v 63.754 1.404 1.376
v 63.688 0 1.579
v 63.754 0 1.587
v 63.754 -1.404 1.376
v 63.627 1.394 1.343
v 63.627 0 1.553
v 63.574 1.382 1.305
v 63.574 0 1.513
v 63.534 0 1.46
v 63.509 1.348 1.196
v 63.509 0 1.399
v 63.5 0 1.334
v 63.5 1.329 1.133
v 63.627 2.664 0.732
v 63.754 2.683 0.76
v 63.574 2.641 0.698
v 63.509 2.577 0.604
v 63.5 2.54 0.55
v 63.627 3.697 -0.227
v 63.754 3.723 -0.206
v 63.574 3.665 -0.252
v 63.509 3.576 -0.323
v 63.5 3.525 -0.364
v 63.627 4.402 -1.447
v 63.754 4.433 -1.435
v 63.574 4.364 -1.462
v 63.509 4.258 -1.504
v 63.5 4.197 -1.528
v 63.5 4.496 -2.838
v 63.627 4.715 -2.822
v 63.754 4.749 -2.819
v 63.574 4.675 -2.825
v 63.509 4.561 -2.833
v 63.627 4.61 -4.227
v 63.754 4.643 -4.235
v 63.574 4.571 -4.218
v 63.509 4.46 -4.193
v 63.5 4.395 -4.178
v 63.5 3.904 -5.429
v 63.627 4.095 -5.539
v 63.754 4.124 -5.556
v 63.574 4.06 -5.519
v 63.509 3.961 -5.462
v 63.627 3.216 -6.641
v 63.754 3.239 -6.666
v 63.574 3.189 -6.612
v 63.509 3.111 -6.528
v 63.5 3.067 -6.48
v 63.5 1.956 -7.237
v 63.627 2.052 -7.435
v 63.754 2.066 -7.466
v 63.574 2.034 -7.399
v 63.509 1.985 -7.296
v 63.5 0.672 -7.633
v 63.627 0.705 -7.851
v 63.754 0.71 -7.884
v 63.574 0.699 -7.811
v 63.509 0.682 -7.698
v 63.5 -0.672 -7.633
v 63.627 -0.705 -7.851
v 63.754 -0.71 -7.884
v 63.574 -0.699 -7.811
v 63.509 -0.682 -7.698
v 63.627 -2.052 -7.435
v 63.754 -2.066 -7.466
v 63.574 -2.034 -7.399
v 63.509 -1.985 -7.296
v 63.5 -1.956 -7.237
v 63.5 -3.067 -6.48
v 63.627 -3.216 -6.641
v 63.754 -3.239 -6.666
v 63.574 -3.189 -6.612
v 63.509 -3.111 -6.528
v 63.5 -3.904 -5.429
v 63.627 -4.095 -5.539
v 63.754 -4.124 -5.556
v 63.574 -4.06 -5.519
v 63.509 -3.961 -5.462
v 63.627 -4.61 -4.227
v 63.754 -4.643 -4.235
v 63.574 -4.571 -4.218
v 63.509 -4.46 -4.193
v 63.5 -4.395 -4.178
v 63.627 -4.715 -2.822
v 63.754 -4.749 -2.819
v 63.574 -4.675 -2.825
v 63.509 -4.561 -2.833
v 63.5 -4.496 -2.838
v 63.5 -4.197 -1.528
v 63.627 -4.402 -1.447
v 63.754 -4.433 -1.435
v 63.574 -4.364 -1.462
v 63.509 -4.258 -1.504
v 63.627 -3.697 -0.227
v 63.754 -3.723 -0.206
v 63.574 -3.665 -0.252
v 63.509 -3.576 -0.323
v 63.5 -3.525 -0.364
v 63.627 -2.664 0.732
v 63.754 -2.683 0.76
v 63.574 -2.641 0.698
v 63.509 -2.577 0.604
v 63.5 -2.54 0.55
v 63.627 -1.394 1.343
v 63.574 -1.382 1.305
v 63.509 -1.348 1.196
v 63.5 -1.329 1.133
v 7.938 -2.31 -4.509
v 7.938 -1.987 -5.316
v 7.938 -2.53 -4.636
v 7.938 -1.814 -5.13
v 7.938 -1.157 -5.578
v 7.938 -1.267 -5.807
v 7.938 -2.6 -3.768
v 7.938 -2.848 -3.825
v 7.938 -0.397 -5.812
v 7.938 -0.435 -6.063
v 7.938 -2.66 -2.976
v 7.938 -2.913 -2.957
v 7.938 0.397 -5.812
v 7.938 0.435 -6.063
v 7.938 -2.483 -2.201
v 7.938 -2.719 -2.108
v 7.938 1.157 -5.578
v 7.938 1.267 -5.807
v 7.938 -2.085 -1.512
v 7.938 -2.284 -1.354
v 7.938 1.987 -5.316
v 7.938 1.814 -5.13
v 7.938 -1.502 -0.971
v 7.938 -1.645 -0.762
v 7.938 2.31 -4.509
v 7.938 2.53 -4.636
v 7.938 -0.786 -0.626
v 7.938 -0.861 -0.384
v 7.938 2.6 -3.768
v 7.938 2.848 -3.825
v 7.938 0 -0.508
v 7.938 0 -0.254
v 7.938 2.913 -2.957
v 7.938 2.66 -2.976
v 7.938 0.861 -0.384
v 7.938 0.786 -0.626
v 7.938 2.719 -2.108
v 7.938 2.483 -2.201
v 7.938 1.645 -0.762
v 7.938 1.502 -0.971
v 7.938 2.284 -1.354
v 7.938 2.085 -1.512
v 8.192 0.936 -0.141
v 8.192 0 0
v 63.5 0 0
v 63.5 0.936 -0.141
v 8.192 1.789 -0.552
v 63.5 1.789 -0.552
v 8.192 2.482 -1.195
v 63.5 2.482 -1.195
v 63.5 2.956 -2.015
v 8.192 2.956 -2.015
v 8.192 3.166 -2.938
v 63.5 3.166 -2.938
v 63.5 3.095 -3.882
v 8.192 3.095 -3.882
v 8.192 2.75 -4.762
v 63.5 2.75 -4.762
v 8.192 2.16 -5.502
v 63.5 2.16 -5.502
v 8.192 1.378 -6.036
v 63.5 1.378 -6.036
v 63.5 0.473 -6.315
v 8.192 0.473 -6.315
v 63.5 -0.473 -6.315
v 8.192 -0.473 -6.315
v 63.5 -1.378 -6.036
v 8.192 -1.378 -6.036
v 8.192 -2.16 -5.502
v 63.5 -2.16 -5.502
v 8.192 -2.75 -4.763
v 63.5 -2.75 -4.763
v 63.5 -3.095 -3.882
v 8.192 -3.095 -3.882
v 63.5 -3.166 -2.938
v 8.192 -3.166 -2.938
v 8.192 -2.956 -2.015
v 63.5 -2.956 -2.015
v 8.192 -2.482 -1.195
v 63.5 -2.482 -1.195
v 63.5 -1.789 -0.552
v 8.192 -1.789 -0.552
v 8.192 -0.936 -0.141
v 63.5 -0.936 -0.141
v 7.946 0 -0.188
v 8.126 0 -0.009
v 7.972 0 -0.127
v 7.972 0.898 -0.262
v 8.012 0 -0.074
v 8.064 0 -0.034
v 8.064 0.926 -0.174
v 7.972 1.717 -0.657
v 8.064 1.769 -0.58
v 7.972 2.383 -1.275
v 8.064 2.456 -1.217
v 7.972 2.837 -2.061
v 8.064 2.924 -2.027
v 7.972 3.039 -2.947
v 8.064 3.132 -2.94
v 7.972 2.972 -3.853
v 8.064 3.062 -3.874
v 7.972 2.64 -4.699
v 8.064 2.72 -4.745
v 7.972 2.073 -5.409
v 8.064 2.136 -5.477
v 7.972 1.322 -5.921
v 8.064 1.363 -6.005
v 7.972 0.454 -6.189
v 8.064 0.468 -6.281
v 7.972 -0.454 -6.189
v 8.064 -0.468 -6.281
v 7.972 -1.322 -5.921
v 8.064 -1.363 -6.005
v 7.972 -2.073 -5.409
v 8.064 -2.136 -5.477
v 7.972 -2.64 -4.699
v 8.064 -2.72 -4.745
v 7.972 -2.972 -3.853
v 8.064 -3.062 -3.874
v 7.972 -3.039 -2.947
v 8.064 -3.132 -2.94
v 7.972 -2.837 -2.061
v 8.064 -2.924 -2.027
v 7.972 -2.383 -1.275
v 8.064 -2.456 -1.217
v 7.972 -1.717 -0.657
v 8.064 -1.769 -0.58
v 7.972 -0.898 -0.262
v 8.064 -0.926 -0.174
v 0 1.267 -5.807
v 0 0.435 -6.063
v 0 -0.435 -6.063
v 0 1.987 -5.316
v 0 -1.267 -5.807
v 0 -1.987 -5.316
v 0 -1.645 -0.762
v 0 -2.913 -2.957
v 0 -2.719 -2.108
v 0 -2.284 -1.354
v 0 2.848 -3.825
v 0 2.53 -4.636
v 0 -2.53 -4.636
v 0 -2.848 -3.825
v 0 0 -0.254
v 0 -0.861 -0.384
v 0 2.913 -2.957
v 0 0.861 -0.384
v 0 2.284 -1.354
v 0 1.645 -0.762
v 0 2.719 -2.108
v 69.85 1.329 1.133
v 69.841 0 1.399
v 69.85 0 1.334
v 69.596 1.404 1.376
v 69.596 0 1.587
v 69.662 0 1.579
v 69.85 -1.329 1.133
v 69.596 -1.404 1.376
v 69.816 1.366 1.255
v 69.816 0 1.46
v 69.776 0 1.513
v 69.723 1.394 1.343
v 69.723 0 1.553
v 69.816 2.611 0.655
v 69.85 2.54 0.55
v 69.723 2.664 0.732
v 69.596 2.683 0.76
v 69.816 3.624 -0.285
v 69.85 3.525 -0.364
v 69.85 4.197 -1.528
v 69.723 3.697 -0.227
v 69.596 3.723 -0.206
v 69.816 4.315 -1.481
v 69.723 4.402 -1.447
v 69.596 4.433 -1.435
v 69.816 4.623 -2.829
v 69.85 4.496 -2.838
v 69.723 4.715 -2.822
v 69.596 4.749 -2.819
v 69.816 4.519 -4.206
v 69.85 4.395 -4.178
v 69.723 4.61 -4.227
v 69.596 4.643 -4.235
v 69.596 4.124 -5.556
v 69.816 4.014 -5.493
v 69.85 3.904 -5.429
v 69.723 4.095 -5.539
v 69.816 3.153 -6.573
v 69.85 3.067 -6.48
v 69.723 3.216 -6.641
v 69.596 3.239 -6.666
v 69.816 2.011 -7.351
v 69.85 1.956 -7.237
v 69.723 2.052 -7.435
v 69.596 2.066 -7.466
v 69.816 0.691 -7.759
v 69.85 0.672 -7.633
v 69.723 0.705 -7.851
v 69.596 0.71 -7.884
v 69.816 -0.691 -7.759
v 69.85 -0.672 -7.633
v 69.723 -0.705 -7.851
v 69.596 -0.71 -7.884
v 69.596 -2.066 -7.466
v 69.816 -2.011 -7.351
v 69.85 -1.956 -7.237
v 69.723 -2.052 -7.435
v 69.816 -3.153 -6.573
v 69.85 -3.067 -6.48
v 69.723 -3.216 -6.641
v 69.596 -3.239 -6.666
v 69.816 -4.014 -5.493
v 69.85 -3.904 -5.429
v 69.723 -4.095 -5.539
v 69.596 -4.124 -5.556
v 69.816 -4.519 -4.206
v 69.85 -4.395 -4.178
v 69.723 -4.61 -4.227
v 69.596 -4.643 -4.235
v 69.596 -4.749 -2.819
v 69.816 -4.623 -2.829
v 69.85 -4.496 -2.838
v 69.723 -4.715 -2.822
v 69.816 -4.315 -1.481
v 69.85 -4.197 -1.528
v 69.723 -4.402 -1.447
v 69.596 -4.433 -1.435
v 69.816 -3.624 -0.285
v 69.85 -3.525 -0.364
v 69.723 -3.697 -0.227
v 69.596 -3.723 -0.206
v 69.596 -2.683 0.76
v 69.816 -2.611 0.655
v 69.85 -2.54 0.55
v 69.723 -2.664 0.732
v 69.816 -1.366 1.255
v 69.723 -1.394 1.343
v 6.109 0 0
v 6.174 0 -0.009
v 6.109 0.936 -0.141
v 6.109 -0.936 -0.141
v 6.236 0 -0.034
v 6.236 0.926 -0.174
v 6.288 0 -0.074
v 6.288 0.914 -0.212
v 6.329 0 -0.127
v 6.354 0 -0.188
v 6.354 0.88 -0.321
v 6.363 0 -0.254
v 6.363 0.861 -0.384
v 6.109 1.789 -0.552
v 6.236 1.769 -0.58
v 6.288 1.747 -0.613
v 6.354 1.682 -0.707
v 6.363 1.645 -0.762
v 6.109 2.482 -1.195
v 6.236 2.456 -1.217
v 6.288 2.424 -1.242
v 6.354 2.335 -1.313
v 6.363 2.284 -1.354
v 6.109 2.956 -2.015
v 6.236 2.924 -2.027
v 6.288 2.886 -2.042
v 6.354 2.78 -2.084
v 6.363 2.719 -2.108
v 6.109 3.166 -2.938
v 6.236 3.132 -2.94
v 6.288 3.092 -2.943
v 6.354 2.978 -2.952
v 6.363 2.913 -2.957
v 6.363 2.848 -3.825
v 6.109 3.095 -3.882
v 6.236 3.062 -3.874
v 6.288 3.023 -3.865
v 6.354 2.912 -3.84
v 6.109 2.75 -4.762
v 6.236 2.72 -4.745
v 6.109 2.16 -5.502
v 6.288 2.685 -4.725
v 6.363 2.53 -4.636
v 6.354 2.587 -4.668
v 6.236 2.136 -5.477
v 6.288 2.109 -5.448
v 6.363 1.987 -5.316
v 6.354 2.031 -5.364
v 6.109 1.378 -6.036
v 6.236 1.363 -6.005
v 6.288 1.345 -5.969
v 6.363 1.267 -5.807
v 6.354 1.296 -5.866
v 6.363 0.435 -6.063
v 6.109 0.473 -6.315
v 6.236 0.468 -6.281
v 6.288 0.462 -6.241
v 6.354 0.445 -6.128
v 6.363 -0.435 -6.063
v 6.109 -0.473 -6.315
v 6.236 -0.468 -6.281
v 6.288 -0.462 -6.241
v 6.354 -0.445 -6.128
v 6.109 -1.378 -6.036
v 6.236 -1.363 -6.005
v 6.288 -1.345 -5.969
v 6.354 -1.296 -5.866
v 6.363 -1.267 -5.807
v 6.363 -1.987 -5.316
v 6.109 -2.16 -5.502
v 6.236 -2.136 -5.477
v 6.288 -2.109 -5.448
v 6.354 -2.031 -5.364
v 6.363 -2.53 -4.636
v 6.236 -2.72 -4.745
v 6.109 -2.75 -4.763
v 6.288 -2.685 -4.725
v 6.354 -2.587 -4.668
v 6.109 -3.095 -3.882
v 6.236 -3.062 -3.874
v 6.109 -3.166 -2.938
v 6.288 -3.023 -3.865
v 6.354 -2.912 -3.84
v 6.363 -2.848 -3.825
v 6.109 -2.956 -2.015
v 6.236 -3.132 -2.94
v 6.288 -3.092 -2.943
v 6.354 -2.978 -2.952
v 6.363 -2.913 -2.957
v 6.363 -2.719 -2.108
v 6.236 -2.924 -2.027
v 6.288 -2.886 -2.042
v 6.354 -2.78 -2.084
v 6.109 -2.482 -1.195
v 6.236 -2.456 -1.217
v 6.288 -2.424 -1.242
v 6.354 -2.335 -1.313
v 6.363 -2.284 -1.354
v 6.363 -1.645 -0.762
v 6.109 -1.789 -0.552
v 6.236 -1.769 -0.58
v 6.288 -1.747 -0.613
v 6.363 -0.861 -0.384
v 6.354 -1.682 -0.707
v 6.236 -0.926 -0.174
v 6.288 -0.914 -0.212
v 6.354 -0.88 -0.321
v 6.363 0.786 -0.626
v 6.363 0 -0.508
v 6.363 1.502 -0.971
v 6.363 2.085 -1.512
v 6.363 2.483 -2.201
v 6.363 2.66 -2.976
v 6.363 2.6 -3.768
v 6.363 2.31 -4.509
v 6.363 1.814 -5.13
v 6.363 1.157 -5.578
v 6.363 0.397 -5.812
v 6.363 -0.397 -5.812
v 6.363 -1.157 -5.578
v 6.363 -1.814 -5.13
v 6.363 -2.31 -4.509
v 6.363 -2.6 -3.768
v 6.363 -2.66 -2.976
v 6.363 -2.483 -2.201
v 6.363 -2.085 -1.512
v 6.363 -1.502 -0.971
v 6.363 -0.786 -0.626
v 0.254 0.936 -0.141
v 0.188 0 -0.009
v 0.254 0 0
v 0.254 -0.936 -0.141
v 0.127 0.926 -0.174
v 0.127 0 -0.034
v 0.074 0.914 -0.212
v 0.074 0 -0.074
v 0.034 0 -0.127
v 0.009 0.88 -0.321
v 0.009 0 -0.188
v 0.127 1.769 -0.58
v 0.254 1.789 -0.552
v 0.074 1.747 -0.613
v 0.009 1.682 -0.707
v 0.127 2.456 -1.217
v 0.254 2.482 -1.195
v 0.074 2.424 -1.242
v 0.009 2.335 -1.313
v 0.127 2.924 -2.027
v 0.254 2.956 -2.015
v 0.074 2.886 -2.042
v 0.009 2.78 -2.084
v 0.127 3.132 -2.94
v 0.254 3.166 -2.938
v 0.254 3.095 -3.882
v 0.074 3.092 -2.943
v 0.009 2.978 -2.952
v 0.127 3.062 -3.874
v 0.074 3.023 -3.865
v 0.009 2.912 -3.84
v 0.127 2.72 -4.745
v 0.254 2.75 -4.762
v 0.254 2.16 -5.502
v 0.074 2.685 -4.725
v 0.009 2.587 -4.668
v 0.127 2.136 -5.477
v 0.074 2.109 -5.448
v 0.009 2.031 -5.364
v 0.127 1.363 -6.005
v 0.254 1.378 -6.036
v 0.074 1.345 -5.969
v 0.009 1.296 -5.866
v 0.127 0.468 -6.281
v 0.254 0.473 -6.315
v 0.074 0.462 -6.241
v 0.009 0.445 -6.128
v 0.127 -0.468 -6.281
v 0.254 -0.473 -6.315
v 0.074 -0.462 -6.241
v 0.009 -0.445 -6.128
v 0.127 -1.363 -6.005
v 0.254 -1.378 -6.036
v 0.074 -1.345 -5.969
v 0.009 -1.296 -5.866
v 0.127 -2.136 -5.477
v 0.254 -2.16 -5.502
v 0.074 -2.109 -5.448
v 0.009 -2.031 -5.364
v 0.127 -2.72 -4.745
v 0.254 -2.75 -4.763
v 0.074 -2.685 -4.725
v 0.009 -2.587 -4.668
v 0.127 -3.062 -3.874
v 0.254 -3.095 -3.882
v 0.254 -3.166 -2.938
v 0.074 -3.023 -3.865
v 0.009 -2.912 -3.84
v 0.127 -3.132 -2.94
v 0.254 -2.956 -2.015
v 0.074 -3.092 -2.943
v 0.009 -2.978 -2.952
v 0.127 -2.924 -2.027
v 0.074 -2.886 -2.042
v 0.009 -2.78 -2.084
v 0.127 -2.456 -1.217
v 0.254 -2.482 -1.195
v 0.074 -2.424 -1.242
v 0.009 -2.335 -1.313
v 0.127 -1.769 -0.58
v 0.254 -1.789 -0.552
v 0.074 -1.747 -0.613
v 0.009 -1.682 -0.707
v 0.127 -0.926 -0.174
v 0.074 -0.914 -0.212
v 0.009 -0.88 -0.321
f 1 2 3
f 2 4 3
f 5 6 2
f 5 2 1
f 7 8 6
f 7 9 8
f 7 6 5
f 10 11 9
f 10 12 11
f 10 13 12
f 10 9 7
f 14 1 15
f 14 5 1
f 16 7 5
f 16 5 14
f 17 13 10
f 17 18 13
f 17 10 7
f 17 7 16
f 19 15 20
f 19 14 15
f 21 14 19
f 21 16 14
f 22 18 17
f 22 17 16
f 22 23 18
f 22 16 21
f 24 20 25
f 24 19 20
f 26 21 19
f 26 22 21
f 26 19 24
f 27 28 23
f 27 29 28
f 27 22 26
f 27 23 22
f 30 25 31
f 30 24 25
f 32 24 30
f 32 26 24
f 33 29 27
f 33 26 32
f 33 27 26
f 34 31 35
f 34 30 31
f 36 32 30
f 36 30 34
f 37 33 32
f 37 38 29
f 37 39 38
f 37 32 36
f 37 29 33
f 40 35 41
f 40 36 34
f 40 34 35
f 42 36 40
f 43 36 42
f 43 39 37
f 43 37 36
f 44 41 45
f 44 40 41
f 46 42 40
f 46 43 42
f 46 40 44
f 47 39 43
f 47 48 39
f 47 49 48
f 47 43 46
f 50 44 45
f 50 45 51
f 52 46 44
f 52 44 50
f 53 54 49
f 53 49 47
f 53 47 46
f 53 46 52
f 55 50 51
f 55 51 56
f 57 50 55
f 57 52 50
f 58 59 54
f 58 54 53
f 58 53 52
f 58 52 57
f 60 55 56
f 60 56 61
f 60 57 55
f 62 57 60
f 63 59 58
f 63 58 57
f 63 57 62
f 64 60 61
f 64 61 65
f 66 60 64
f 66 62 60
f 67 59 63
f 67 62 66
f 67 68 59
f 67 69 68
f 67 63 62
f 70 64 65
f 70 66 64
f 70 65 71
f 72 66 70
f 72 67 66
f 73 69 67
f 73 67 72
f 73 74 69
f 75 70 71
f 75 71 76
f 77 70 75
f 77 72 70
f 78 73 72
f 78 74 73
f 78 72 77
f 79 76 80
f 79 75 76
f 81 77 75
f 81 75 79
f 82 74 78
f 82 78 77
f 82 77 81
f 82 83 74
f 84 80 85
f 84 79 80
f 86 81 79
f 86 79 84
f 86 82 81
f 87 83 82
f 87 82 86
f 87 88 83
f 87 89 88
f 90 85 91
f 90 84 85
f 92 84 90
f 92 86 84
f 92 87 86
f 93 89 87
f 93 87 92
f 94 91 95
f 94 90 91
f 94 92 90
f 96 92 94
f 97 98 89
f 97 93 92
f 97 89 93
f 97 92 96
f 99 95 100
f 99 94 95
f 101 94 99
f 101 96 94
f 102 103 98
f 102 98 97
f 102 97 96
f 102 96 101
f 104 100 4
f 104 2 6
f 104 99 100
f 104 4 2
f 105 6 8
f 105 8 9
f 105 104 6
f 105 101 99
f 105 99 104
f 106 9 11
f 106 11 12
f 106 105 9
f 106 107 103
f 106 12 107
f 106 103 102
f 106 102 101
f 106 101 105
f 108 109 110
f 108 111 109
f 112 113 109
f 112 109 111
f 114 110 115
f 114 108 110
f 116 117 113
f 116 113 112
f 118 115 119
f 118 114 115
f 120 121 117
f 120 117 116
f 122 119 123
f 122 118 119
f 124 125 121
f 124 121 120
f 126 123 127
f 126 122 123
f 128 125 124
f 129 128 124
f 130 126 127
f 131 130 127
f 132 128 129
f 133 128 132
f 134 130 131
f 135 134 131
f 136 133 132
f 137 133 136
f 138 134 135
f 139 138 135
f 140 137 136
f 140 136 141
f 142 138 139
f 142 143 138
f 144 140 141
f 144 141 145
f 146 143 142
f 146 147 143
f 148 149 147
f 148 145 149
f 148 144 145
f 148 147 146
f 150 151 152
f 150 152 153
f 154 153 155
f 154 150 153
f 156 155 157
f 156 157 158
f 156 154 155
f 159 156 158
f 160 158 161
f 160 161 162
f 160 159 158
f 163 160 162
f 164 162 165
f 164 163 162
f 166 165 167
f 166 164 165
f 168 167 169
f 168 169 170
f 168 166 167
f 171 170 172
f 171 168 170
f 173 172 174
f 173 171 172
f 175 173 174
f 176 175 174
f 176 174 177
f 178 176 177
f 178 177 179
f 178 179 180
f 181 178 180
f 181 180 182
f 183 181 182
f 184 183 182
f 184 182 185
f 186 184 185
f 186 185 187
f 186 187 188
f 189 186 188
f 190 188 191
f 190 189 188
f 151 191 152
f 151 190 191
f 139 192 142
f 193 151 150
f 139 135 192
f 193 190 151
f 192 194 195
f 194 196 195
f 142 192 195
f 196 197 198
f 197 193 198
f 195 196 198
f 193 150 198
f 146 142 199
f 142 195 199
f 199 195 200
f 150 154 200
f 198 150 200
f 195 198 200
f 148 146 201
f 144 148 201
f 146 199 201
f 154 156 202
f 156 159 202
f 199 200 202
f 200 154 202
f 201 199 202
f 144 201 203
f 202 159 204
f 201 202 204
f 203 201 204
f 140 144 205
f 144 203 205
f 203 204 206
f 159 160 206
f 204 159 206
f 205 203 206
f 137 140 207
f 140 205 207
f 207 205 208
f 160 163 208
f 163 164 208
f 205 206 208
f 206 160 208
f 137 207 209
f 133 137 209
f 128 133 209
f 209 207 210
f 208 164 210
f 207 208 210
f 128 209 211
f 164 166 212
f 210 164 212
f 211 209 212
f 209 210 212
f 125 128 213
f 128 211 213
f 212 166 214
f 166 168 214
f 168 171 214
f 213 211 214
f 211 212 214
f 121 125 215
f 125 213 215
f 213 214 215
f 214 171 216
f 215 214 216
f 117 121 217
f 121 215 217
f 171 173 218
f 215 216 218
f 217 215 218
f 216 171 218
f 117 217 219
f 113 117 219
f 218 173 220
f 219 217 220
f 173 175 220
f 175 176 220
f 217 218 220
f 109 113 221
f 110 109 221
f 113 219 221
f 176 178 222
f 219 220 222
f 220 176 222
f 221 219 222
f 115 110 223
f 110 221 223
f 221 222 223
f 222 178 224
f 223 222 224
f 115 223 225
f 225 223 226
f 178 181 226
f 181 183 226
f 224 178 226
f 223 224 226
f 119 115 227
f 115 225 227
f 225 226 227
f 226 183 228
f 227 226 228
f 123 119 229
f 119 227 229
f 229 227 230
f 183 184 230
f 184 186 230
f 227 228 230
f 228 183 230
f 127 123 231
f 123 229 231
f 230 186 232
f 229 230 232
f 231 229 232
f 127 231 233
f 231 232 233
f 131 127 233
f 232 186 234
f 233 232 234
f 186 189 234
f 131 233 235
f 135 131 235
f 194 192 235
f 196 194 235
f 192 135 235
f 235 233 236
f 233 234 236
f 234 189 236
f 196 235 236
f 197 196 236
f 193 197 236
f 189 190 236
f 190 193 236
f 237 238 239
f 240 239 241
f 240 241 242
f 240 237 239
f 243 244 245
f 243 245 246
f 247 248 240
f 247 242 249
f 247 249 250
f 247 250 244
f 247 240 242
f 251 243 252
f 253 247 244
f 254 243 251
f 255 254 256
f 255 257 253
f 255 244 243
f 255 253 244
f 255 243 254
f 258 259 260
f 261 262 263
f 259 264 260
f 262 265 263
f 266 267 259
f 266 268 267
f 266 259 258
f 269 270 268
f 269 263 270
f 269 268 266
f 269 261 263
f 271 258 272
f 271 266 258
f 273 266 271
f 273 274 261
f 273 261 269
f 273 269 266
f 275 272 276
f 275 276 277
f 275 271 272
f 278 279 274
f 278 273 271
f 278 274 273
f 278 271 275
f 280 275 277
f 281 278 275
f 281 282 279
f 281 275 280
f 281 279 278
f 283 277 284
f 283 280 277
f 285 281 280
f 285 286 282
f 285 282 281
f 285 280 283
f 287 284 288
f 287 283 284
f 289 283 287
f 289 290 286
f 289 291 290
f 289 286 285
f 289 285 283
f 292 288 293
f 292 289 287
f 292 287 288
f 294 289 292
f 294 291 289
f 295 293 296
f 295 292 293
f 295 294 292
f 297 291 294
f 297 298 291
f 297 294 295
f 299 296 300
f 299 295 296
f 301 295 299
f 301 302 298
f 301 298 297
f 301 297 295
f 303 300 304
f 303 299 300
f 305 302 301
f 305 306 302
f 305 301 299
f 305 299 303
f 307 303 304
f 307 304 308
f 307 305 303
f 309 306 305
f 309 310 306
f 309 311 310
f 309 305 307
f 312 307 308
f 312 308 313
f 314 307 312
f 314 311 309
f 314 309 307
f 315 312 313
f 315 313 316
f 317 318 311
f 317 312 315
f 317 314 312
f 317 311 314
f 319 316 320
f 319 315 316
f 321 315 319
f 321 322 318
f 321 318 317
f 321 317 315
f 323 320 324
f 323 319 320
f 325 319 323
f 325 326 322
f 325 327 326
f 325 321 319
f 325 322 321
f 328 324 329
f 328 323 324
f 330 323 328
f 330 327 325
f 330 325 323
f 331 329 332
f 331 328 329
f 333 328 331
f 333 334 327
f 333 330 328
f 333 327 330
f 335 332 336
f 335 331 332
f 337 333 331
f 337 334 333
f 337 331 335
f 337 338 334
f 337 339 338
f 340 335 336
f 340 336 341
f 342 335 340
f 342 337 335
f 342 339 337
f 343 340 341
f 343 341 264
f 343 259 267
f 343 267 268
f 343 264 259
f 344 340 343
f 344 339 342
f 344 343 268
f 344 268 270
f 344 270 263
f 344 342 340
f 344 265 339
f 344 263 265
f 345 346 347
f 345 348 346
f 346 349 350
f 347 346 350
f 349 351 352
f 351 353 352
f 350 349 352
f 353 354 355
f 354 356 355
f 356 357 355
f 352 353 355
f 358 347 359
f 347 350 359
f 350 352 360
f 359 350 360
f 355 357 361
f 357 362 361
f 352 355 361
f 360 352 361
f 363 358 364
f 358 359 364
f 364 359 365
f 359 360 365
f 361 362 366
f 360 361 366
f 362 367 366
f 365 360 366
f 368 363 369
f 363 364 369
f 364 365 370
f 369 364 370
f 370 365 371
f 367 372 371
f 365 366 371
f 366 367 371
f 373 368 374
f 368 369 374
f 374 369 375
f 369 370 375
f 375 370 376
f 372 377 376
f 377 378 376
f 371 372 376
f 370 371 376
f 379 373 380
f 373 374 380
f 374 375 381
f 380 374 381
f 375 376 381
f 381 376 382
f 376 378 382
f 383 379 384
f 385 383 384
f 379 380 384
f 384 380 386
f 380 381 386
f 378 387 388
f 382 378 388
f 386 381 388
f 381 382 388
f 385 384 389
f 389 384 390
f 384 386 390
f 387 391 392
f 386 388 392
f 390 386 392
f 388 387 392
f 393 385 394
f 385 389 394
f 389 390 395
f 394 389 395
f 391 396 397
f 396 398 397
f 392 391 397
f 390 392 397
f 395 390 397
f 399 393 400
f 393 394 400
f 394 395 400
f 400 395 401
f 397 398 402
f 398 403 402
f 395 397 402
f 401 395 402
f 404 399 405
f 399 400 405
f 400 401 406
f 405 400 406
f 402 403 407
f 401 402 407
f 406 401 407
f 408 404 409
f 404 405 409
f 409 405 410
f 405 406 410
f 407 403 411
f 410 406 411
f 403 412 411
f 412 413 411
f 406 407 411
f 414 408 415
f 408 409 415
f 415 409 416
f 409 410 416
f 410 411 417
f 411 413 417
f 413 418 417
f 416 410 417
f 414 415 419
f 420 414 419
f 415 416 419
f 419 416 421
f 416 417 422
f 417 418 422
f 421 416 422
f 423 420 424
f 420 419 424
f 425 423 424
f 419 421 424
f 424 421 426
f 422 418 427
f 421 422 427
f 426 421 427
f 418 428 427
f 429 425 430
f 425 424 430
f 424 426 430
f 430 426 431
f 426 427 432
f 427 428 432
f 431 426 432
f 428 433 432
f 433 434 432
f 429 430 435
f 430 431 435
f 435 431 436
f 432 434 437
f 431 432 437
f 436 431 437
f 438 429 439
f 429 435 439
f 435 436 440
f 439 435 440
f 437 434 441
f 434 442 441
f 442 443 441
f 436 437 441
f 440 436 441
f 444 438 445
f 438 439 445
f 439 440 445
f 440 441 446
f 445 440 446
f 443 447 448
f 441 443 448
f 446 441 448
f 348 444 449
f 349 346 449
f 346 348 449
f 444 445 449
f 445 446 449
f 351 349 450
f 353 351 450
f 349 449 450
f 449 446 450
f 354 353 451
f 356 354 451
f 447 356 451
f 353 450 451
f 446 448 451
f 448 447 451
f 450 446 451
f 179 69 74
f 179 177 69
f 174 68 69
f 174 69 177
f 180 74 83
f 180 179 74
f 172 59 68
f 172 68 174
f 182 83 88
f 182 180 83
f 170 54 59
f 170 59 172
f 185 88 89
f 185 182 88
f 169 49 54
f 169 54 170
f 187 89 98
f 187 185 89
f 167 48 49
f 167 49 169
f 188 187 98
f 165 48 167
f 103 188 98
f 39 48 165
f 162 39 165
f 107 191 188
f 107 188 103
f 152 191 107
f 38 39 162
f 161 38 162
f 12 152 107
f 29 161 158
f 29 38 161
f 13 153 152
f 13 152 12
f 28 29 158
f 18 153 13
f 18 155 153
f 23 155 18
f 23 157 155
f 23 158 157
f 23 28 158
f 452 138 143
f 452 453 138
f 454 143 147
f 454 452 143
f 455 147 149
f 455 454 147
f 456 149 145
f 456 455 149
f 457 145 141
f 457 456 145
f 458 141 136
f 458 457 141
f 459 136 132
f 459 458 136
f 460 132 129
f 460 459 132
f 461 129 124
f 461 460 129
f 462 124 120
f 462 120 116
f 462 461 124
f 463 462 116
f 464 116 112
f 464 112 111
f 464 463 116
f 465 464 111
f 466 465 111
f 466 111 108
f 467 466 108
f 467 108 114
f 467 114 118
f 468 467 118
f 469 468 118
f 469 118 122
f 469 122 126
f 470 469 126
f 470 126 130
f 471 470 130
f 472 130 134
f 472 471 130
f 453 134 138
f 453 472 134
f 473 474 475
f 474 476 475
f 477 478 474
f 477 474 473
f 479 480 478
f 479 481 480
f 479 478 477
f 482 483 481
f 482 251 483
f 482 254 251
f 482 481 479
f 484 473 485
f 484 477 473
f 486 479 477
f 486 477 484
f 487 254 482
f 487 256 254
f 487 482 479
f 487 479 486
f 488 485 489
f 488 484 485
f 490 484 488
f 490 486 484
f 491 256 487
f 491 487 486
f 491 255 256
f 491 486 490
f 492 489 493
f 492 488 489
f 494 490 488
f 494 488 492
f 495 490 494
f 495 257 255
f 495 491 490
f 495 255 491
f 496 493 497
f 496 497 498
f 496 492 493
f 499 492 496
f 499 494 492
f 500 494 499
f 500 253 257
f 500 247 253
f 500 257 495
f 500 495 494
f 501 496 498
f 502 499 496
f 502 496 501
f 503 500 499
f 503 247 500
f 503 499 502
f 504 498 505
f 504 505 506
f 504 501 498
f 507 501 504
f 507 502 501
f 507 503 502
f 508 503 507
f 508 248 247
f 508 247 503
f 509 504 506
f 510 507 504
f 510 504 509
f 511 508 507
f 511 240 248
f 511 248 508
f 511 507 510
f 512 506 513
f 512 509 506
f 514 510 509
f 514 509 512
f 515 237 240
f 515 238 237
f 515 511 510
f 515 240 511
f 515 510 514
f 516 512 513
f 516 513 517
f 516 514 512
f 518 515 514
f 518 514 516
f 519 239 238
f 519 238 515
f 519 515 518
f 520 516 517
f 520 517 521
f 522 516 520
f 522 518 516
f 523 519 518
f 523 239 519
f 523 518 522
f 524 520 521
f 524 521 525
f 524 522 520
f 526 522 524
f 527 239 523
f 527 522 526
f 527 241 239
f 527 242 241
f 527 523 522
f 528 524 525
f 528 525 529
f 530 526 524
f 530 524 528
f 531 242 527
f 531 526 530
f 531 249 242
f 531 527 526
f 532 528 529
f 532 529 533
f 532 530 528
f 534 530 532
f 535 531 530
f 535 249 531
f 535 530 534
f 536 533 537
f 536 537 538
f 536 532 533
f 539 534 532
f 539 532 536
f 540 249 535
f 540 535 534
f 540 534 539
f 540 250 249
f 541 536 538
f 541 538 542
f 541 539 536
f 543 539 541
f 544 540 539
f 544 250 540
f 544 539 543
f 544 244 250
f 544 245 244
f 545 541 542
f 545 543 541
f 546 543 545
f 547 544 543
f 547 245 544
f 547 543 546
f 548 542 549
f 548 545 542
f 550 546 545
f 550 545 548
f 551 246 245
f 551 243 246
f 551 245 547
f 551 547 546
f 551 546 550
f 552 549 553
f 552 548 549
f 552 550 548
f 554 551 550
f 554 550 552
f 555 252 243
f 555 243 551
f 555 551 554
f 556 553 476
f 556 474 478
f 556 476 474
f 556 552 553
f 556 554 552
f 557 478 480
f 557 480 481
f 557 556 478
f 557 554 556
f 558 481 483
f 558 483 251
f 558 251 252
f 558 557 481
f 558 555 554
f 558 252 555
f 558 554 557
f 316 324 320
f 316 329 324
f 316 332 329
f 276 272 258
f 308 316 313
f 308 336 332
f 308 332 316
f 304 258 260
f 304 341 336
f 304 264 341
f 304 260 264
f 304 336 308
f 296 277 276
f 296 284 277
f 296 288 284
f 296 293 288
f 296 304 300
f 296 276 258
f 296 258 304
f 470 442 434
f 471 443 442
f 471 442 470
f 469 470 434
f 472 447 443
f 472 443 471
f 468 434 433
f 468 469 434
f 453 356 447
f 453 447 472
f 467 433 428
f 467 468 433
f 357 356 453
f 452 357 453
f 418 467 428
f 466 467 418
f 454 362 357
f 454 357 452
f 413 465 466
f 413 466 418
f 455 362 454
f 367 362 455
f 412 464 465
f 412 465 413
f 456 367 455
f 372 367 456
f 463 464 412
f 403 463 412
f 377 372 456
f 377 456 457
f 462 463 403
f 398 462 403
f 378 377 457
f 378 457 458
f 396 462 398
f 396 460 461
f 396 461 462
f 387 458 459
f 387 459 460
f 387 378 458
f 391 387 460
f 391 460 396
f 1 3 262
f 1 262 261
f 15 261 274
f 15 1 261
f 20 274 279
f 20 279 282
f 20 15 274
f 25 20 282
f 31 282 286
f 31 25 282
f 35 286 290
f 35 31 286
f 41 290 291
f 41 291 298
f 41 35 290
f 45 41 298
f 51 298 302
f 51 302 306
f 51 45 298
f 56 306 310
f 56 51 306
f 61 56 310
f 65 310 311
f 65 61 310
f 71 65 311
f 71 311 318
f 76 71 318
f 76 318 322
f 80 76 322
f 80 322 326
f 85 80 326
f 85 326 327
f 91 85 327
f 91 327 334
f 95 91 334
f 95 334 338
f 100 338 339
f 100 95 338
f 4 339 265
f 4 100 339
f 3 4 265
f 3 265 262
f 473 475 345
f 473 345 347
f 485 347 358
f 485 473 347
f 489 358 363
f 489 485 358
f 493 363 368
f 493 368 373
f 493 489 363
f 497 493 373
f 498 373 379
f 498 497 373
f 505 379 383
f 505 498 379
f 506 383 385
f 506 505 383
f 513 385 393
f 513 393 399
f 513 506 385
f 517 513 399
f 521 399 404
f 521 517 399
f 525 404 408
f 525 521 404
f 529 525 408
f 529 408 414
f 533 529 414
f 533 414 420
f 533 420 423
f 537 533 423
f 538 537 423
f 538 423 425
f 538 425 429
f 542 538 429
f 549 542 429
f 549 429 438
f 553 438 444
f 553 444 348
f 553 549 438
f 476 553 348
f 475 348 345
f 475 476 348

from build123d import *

# Parameters (mm, degrees)
F2_R = 0.254
F3_R = 0.254


with BuildPart() as f1:
    # F0 (on Front) → F1 (revolve)
    with BuildSketch(Plane.XZ):
        Polygon((6.3627, 0), (0, 0), (0, -3.175), (69.85, -3.175), (69.85, 1.5875), (63.5, 1.5875), (63.5, 0), (7.9375, 0), (7.9375, -0.508), (6.3627, -0.508), align=None)
    revolve(axis=Axis((34.925, 0, -3.175), (-1, 0, 0)))

    # F2
    f2_edges = [f1.edges().sort_by_distance(p)[0] for p in [
        (0, 0, -6.35),
        (63.5, 0, -7.9375),
        (69.85, 0, -7.9375),
    ]]
    fillet(f2_edges, radius=F2_R)

    # F3
    f3_edges = [f1.edges().sort_by_distance(p)[0] for p in [
        (7.9375, 0, -6.35),
        (6.3627, 0, -6.35),
    ]]
    fillet(f3_edges, radius=F3_R)


solid = f1.part
